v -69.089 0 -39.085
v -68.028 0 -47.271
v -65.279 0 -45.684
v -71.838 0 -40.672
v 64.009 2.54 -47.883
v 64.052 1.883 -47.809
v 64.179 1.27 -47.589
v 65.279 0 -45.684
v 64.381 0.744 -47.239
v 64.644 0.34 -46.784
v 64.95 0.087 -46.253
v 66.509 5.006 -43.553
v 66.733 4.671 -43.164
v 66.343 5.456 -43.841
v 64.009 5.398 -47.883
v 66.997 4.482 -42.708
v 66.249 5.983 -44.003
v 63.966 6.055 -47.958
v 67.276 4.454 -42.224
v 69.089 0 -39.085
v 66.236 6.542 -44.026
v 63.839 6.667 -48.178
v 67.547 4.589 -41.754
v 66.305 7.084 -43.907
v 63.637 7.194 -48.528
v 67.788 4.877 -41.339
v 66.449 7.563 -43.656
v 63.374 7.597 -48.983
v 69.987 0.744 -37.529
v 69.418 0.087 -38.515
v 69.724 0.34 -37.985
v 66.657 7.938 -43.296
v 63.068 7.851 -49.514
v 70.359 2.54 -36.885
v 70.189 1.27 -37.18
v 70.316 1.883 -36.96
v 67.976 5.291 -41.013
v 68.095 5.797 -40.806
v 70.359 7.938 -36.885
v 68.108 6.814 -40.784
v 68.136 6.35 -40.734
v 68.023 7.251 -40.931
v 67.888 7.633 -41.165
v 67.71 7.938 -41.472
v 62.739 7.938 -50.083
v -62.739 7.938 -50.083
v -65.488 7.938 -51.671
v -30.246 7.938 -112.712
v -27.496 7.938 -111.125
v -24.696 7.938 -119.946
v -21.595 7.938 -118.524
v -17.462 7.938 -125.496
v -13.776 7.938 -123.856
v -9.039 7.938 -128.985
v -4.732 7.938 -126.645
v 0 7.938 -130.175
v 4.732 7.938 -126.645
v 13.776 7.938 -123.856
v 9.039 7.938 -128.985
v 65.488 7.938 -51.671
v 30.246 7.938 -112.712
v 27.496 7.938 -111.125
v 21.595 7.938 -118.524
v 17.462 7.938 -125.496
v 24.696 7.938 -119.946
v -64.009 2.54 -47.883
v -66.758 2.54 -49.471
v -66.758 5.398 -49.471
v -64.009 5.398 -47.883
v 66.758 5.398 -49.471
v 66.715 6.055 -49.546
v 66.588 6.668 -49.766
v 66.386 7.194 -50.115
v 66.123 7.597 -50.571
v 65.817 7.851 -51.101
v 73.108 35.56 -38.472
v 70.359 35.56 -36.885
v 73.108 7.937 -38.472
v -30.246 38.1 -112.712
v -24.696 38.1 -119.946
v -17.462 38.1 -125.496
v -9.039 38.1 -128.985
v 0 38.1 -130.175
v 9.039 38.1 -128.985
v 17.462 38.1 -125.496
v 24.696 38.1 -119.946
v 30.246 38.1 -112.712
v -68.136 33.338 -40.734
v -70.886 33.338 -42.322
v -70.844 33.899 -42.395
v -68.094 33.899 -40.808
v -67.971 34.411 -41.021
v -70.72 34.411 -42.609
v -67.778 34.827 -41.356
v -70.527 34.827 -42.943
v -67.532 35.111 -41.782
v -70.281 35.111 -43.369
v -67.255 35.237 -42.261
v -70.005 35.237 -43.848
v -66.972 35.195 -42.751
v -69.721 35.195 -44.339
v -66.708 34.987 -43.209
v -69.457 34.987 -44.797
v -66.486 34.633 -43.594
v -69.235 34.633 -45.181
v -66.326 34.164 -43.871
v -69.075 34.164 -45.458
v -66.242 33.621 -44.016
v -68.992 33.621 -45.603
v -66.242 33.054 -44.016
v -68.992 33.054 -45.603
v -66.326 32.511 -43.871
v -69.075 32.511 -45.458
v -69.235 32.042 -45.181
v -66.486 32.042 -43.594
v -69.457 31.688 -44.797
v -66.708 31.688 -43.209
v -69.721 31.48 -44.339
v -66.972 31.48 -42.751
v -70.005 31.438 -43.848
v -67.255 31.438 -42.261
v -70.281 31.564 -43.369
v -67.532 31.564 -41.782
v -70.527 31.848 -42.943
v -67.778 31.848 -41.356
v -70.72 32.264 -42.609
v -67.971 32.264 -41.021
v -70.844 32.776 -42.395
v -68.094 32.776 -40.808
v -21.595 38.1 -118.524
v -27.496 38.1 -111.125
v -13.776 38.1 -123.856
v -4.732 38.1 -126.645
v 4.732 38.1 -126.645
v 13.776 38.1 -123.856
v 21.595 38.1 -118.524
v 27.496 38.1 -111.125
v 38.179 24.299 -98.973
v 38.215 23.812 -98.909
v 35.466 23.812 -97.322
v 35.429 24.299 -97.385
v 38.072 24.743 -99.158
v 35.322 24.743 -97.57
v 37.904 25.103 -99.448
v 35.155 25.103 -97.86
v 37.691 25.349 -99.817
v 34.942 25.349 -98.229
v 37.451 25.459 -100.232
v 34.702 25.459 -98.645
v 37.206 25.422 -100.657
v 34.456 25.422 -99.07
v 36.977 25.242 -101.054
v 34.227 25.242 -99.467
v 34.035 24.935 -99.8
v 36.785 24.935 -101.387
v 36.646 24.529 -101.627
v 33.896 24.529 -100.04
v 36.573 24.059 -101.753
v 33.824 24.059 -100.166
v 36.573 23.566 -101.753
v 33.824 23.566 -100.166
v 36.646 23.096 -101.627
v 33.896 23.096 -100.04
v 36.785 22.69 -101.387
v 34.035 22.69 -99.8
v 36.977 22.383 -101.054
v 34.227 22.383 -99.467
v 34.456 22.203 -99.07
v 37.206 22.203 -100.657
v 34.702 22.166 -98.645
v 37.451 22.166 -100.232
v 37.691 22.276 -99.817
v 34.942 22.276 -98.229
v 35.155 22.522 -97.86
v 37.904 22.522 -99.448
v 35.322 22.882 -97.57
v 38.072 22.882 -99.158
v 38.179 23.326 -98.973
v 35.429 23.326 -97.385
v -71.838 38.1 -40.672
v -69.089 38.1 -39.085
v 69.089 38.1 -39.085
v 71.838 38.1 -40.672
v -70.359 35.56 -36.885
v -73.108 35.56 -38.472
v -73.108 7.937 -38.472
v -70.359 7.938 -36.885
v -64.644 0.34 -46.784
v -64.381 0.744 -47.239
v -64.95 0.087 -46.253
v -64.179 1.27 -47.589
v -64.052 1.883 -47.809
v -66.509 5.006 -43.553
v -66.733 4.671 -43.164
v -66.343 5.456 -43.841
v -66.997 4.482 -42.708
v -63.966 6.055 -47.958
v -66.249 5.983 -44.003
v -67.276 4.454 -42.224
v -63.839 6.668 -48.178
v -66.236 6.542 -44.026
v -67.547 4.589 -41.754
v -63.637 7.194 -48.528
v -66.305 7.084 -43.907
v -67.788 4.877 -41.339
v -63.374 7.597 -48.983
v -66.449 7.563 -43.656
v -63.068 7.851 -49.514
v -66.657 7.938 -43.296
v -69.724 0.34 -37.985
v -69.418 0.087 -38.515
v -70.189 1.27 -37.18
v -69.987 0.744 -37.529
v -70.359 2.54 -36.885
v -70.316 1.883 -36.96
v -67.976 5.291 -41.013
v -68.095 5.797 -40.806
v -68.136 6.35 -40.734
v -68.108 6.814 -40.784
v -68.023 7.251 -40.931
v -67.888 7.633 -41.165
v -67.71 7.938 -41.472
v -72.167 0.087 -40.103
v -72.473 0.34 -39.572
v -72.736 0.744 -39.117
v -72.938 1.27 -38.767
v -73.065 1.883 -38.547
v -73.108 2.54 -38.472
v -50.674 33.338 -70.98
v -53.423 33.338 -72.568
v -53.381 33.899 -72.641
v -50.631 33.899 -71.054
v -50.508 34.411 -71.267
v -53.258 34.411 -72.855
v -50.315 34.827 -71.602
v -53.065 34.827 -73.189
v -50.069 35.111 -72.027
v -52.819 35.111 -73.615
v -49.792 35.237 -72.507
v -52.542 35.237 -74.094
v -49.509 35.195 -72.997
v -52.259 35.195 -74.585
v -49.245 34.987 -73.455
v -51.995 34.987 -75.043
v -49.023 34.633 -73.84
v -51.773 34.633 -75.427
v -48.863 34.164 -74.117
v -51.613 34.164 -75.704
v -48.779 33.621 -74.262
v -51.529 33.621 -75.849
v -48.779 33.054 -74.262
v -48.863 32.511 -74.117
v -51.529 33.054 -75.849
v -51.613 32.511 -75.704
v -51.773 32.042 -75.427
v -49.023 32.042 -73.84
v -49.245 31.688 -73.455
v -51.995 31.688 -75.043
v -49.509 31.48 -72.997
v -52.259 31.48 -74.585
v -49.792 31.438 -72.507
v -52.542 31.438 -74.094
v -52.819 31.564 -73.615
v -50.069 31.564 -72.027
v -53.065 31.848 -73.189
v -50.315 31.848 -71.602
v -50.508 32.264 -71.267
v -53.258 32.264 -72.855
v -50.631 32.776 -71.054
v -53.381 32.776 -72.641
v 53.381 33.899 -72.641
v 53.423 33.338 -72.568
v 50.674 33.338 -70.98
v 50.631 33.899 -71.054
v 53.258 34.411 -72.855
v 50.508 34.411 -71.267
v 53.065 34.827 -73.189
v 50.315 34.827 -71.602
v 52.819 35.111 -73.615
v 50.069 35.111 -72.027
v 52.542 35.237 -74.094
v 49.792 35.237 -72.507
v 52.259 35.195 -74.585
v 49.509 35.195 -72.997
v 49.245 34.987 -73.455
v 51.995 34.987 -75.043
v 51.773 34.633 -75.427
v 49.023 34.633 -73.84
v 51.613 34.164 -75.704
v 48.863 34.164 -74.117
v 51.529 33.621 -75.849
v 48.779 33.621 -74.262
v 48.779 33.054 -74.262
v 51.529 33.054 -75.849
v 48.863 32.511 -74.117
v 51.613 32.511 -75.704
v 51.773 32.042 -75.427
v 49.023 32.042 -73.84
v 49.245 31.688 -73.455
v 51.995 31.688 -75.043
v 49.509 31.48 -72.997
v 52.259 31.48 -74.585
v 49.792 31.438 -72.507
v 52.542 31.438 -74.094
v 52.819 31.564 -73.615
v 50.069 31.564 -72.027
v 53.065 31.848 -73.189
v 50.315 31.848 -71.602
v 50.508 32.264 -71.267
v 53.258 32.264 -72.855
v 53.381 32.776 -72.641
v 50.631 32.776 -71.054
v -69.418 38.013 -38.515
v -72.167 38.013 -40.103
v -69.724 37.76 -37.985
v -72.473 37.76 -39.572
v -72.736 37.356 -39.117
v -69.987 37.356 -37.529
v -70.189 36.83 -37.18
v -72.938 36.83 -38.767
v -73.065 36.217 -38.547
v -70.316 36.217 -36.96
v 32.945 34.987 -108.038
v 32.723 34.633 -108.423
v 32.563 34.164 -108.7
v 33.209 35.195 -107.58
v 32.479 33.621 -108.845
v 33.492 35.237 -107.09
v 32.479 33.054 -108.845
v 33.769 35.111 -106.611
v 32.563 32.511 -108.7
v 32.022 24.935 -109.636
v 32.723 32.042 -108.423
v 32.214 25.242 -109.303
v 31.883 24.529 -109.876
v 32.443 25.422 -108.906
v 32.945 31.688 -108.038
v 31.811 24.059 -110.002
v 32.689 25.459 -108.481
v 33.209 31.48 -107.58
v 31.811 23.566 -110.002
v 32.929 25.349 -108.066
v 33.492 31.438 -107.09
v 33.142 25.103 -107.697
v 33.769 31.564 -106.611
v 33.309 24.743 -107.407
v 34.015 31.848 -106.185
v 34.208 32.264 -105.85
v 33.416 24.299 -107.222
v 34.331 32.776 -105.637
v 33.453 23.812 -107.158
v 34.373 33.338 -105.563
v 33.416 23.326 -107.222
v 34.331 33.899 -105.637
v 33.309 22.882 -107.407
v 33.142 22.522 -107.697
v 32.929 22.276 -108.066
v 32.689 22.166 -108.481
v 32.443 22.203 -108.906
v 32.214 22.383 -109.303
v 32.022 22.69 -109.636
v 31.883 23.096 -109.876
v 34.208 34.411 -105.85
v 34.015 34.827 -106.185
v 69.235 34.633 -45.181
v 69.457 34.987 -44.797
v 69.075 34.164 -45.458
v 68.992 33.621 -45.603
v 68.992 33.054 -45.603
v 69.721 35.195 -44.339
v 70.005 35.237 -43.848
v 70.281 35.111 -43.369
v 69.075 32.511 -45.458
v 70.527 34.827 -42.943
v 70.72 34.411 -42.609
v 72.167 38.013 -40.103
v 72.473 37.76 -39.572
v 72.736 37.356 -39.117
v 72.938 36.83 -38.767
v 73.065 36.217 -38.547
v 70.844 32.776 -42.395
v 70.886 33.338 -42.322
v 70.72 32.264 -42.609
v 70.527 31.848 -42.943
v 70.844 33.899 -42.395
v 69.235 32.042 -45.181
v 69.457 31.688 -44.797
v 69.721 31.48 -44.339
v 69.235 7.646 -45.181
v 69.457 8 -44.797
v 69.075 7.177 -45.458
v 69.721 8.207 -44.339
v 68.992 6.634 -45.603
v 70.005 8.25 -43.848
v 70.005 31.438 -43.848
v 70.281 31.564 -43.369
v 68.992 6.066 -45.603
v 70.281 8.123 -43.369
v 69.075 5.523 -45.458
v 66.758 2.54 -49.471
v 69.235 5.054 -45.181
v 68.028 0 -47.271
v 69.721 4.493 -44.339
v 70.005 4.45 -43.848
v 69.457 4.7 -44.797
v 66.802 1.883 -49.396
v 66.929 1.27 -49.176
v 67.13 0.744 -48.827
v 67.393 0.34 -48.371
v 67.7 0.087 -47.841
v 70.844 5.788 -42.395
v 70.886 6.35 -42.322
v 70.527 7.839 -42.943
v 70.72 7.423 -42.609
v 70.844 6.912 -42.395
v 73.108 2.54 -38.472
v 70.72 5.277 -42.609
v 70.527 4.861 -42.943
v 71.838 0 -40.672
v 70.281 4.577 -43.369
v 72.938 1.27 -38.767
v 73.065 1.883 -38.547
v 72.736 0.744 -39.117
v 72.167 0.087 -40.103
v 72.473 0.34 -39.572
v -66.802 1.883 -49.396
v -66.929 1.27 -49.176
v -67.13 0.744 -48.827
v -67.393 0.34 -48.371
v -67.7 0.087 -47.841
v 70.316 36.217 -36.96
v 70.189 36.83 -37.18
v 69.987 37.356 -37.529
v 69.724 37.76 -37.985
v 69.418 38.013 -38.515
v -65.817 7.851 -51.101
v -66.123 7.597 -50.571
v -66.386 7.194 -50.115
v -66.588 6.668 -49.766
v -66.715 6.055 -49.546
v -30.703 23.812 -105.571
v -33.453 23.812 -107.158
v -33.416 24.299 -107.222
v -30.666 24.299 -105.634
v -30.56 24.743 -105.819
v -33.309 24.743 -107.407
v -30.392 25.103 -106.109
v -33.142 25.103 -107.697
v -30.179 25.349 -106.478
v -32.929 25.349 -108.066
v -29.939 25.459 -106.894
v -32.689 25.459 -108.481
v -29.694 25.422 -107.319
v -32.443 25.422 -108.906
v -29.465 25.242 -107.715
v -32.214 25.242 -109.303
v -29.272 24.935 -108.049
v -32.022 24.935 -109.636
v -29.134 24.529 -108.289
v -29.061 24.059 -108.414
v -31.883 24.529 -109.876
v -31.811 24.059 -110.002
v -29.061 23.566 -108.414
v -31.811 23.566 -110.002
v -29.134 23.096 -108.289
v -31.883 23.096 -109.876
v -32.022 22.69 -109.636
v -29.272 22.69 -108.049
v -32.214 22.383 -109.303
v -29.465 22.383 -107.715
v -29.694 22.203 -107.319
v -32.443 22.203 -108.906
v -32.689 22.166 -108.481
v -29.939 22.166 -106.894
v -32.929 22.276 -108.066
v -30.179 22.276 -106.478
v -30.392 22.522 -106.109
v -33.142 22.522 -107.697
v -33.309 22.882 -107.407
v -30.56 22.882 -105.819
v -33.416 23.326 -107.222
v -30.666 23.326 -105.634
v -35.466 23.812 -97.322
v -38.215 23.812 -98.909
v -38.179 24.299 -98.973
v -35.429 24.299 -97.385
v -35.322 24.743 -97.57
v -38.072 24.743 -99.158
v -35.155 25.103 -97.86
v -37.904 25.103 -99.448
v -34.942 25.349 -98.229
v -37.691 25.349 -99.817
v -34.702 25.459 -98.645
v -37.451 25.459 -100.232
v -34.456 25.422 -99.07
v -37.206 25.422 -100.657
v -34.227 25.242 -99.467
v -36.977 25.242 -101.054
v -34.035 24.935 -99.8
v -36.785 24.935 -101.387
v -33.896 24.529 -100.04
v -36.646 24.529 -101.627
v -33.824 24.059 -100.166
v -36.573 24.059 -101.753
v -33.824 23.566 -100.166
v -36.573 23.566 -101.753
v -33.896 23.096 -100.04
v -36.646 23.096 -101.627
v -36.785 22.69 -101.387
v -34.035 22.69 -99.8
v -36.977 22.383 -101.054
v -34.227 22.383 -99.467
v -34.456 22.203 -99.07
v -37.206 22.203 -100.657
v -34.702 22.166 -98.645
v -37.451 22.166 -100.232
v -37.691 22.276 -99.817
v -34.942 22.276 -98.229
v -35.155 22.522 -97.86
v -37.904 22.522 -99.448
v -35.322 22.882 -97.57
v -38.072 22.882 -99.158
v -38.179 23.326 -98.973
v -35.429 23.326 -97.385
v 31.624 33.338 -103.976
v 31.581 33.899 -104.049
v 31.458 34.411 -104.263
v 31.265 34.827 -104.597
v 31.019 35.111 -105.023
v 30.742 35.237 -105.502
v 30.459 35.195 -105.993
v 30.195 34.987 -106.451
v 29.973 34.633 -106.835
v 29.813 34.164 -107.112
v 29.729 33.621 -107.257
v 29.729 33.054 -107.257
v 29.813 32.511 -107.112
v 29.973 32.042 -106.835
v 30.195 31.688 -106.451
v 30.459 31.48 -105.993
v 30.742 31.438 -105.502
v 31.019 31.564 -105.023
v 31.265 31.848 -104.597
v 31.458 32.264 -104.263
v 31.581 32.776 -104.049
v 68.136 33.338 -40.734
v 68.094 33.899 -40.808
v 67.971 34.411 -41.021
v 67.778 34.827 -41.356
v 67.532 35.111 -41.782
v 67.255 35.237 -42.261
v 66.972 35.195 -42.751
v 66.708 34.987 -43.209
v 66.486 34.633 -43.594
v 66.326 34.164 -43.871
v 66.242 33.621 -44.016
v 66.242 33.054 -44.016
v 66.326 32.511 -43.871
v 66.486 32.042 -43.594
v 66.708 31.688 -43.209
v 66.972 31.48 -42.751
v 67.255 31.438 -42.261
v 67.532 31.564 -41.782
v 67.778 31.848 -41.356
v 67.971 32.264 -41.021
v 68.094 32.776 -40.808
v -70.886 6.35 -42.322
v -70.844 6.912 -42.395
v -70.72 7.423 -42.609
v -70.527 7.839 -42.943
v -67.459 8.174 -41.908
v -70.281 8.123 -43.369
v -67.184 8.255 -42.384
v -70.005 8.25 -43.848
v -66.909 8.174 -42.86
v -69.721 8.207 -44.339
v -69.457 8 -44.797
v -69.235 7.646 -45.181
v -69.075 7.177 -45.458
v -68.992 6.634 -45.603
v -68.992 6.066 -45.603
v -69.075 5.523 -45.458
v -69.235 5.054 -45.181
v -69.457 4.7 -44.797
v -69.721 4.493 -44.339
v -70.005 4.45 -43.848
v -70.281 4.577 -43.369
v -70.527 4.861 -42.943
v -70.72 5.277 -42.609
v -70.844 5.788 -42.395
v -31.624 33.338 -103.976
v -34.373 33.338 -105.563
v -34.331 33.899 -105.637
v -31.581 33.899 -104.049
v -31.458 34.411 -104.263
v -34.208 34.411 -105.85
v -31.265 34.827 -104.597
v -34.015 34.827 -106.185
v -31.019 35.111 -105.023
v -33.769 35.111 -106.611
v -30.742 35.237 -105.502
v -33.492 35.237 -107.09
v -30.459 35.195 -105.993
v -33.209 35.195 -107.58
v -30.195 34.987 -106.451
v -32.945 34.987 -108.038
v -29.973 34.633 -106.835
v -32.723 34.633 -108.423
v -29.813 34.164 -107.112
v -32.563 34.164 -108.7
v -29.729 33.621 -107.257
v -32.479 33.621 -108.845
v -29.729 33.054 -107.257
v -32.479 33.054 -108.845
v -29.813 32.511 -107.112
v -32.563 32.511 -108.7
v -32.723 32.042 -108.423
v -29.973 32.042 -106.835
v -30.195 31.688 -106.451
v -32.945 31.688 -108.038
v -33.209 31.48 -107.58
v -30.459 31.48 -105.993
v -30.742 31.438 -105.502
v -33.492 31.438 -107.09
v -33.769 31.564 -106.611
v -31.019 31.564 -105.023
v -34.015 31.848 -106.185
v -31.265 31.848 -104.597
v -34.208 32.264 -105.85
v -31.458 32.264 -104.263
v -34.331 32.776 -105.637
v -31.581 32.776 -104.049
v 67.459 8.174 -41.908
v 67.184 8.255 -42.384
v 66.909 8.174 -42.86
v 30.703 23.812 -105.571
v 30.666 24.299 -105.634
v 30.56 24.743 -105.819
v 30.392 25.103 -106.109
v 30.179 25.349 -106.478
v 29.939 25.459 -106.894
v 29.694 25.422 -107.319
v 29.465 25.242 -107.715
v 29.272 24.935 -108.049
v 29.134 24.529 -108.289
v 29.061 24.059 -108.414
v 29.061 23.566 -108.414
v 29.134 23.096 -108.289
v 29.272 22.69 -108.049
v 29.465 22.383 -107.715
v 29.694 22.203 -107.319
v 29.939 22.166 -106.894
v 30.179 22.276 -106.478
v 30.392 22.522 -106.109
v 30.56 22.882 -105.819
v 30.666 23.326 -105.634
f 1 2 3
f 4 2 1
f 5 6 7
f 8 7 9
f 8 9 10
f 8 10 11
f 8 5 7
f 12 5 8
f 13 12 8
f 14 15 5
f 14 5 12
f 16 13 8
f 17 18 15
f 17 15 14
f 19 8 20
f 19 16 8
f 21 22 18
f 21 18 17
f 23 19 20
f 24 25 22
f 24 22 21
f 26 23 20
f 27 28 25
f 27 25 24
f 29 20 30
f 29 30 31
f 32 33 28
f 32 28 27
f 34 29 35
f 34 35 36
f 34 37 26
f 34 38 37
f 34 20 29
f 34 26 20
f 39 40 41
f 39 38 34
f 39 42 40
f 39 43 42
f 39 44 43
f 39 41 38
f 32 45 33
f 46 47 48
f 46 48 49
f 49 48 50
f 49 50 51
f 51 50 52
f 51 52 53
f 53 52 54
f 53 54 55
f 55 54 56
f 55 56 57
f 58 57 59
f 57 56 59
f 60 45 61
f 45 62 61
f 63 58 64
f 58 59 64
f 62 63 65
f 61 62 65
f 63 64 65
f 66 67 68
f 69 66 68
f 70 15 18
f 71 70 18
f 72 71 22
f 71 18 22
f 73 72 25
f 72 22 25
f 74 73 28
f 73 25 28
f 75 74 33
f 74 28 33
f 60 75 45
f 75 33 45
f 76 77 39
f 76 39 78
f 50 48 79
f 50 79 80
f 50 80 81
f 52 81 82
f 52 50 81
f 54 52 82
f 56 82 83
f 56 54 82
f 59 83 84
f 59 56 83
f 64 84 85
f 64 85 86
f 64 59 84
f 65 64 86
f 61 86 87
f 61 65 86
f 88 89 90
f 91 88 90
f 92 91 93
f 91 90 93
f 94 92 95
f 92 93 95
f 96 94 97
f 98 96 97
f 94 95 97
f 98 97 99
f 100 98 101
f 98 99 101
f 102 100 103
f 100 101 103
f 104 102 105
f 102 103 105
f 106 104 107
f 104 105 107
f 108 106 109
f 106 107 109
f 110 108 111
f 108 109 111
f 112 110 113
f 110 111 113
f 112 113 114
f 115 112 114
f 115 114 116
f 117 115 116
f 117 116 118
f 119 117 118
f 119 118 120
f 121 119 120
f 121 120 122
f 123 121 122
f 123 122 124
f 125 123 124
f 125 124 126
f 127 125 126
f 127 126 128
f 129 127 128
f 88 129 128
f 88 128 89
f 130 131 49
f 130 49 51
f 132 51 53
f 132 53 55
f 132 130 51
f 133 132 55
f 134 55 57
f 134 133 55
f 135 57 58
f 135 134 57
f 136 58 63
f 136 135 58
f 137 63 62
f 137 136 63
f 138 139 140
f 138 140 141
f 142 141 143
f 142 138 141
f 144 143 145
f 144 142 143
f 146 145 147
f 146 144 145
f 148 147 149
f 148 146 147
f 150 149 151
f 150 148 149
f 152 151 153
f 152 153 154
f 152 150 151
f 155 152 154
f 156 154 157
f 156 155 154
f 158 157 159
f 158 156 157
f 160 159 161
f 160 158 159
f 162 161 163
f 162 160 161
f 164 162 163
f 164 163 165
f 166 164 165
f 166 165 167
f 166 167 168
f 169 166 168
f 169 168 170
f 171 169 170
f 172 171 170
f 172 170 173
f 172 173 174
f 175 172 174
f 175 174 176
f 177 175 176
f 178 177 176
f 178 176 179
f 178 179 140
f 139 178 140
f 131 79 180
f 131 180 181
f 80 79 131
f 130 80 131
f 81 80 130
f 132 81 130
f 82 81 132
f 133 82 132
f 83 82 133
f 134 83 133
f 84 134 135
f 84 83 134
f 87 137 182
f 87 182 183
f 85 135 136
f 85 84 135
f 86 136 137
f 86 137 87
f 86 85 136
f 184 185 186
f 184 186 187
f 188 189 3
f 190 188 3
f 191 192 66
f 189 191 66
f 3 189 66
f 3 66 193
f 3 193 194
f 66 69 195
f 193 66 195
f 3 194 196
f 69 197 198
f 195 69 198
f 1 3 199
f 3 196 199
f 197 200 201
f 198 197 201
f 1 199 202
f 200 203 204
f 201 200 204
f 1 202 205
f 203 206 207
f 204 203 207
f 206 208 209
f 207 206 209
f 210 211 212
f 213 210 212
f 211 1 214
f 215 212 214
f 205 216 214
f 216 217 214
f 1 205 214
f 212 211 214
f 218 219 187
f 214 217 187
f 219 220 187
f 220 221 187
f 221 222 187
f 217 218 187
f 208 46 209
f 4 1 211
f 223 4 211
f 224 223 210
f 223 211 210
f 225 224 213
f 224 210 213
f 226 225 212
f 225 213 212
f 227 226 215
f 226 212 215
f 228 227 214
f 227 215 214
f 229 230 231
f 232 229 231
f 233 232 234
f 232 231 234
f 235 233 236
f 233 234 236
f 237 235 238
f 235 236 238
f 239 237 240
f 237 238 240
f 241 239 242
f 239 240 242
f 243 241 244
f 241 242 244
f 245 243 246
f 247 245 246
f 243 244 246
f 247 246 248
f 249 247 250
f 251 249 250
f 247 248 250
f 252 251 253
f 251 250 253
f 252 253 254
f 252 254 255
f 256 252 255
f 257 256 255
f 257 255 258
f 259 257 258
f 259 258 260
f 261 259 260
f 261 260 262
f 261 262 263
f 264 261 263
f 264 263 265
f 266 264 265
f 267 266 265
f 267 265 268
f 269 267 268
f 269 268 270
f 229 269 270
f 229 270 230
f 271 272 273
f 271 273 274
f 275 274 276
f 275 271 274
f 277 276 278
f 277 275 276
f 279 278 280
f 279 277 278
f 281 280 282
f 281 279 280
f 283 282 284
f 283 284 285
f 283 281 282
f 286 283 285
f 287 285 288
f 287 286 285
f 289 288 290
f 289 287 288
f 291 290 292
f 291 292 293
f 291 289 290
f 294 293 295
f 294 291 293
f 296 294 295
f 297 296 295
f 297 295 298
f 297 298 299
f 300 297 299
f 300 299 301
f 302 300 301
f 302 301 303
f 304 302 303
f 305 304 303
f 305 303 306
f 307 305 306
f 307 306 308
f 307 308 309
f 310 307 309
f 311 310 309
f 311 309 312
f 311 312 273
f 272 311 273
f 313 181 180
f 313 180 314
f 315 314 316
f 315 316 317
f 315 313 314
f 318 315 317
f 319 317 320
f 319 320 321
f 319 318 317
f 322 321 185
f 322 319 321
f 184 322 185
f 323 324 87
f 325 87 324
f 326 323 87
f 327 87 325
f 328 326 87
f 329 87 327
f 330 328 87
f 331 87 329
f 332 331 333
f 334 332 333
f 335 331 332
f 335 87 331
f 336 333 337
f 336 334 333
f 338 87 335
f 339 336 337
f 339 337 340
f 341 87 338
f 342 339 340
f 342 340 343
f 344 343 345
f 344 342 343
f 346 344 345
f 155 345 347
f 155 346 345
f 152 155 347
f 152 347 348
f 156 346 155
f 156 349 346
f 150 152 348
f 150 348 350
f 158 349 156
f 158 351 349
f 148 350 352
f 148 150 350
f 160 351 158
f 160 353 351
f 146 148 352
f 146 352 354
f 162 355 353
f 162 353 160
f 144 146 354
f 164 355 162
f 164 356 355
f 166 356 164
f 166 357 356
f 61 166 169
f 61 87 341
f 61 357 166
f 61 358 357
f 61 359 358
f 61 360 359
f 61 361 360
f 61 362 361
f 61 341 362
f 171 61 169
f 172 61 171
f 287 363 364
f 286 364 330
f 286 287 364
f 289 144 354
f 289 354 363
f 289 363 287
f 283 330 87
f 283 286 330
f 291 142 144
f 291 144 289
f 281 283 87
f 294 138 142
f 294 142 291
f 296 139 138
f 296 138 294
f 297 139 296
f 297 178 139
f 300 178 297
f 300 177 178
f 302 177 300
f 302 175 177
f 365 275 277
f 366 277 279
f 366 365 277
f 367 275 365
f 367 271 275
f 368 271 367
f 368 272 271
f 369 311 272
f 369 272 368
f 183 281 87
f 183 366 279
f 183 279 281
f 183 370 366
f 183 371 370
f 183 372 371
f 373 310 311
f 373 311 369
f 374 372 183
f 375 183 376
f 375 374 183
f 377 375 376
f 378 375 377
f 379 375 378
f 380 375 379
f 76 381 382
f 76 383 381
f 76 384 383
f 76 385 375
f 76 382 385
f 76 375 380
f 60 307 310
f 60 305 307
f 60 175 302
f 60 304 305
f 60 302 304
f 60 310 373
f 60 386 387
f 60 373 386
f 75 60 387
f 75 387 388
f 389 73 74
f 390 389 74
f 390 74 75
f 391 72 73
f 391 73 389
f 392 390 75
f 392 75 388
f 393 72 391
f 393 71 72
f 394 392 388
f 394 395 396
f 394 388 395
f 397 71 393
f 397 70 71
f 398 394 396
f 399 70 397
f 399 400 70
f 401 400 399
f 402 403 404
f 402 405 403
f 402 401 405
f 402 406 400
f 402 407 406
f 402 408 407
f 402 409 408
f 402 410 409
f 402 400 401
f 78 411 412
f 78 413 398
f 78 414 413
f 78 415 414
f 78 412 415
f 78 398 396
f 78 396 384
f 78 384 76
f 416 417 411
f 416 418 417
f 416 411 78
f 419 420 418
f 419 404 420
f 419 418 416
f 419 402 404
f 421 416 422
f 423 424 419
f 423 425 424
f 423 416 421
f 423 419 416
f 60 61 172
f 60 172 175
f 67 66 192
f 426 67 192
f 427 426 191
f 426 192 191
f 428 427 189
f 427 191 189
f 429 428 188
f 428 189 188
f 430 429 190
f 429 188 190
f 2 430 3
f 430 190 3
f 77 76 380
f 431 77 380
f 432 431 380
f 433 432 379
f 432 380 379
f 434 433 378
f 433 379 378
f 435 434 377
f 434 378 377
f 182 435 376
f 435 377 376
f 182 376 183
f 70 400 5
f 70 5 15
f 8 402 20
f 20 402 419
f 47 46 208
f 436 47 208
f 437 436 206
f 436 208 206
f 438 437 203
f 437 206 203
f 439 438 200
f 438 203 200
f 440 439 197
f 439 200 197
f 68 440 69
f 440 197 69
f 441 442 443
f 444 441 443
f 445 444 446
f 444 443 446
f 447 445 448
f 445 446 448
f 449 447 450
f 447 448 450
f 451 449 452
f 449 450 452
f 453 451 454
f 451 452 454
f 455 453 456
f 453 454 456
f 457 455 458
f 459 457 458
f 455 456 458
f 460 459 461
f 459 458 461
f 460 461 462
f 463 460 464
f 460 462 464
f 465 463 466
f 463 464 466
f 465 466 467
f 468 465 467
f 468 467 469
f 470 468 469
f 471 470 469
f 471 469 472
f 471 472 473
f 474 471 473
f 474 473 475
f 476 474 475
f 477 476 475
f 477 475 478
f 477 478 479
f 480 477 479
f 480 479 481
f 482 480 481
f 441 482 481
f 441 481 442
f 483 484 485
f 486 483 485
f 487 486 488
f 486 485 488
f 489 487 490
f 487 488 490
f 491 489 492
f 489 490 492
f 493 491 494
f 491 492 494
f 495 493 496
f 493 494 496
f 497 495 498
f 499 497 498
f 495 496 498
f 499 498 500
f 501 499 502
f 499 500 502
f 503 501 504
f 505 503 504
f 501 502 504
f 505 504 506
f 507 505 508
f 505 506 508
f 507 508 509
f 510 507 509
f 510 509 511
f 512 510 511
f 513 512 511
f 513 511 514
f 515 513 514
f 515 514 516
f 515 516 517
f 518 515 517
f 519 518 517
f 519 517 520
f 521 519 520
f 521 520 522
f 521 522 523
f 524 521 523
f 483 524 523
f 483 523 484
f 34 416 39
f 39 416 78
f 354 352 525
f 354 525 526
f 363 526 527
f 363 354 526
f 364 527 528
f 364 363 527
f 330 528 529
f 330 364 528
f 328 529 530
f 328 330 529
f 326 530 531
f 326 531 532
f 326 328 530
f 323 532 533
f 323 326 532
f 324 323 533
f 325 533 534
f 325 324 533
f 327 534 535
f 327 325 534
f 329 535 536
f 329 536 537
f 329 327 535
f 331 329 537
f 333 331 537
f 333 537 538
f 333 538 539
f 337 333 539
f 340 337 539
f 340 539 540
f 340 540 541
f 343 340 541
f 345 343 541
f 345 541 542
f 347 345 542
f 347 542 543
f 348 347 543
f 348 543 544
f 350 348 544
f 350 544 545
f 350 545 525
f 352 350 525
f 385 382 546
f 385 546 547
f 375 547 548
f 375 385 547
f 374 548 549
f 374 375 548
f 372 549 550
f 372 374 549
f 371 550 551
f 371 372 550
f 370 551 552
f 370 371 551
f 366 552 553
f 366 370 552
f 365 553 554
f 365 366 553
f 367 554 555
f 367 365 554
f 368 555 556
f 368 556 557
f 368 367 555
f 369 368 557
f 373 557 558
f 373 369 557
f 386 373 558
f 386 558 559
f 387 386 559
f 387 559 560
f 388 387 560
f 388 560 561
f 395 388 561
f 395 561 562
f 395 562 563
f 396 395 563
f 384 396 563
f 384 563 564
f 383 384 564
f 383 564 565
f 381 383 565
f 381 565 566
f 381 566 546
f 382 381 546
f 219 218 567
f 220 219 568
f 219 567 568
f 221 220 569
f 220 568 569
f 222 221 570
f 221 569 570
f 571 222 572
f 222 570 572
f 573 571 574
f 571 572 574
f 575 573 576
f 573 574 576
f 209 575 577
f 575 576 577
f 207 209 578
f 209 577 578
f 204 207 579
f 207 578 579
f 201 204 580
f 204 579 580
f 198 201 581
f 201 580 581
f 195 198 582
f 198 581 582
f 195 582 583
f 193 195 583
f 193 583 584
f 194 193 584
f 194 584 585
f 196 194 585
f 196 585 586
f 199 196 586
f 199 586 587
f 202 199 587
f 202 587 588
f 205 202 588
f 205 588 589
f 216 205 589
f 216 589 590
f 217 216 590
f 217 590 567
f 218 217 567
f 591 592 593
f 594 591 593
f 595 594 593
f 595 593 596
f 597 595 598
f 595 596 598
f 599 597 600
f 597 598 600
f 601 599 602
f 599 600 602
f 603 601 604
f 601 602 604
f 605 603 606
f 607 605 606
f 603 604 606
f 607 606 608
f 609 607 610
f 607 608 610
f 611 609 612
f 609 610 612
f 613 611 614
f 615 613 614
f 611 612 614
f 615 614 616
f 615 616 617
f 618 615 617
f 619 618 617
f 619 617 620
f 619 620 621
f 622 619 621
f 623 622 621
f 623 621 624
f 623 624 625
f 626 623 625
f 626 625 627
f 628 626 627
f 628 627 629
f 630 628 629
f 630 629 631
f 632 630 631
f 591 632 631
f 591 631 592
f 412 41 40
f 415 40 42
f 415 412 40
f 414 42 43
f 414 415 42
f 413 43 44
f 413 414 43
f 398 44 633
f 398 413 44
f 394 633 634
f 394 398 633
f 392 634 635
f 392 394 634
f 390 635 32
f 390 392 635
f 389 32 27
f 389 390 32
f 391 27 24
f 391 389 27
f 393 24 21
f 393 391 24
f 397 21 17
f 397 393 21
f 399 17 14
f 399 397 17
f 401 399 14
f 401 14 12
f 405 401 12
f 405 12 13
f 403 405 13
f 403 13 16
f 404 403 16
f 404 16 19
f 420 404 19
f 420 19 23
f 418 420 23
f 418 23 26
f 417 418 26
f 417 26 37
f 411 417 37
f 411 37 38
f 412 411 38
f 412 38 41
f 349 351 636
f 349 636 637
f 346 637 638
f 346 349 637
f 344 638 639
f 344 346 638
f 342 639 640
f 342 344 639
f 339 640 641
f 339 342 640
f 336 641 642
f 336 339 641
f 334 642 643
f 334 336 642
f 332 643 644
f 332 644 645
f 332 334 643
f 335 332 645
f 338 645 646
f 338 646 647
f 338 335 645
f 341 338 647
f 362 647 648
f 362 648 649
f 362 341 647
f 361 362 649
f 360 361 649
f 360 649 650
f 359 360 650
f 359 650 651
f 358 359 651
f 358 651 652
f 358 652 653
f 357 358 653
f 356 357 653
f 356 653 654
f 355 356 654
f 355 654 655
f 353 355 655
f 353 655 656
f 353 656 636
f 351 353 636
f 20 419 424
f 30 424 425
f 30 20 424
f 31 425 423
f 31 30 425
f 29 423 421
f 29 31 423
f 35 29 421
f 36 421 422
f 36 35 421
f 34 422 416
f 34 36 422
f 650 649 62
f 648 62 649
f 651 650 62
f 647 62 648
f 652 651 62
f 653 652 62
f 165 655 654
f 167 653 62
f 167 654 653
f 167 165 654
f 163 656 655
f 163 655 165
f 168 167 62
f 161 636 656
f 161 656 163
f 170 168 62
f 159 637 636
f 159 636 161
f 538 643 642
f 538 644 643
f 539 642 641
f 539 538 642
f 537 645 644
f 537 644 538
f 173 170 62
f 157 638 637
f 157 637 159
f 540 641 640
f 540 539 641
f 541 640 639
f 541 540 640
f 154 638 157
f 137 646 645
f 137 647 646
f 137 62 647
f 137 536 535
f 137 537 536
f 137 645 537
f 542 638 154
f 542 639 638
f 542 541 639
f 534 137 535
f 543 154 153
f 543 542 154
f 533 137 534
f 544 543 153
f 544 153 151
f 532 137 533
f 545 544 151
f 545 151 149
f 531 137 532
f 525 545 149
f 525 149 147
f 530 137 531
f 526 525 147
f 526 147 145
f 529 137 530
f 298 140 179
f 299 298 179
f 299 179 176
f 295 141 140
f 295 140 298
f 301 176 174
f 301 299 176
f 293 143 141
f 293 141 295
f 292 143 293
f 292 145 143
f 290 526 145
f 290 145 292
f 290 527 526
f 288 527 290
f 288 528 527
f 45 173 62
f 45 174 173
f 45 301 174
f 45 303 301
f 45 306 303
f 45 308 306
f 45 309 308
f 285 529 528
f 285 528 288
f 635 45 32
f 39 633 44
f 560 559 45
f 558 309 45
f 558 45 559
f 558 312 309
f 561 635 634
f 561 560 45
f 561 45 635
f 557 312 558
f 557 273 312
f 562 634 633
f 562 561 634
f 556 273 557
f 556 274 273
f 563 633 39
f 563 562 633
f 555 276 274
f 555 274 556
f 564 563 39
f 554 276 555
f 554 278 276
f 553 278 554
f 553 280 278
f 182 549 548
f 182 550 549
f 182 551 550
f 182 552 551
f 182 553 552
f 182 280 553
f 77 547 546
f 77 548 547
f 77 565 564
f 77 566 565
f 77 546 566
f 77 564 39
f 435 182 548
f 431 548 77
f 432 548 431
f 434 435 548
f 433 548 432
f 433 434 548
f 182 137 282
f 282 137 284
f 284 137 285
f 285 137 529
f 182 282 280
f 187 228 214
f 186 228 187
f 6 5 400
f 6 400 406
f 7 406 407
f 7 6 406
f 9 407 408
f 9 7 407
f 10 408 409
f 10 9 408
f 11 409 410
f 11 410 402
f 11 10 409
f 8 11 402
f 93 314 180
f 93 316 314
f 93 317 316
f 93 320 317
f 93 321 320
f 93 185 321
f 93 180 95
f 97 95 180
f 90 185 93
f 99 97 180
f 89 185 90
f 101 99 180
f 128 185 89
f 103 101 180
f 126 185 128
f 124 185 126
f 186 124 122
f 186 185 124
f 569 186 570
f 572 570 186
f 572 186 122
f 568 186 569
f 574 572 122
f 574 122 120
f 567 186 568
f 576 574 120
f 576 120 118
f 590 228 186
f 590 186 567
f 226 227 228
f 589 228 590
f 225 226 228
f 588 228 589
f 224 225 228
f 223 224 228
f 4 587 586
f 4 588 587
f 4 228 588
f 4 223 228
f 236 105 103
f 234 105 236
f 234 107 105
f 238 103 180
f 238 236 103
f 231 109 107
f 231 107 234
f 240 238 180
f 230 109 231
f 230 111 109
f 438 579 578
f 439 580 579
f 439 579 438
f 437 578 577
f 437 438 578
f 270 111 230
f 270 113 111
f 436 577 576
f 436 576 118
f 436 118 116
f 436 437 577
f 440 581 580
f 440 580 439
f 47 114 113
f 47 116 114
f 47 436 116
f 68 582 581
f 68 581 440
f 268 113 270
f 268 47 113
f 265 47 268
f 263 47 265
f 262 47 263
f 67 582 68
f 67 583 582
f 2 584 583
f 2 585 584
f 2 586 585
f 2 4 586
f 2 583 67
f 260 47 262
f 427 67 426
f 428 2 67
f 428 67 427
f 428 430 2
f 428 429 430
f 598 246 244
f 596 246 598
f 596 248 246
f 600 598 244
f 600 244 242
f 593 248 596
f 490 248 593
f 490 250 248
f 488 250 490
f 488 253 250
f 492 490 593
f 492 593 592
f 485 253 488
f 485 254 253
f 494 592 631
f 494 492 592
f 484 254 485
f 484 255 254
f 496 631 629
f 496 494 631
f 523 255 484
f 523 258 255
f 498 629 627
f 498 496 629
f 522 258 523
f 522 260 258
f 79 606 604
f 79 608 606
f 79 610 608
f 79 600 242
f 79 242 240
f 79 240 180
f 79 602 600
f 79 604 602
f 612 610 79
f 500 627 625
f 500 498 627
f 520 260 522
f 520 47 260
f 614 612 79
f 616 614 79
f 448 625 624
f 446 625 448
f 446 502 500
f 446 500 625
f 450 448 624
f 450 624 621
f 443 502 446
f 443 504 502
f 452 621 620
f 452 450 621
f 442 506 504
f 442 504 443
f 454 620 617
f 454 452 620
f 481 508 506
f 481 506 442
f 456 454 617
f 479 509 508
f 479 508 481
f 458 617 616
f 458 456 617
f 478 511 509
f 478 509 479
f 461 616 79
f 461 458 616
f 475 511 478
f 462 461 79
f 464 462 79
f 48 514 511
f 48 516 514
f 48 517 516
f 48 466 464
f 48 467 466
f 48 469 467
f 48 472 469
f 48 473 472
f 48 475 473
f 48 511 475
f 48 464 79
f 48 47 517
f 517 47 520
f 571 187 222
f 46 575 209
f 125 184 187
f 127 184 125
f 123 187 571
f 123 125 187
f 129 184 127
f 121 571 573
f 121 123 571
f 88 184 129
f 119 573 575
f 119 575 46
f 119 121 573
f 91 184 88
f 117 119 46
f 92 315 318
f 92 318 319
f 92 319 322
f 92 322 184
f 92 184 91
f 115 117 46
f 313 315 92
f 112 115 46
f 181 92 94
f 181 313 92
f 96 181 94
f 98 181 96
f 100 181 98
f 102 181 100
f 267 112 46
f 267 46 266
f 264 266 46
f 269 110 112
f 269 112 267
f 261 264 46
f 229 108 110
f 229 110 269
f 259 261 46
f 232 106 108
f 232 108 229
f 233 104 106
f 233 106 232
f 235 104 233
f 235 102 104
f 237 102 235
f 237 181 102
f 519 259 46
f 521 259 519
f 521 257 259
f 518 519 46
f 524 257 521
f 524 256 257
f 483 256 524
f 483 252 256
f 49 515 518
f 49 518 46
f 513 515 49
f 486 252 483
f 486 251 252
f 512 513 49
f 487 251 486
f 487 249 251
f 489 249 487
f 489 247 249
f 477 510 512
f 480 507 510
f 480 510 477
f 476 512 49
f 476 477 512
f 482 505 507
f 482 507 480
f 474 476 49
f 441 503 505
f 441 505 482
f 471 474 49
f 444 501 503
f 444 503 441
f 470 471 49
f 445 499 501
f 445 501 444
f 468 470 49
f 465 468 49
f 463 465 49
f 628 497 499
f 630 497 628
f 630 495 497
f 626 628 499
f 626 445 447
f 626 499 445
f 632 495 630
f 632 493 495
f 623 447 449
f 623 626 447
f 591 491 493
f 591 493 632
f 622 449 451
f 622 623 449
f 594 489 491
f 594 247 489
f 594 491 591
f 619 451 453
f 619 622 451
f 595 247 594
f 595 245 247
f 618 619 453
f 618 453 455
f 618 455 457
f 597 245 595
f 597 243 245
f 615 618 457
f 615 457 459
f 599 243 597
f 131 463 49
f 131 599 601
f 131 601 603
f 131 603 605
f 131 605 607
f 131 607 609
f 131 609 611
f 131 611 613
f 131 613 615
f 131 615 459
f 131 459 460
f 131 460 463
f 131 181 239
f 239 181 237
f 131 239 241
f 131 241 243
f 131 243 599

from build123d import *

# Parameters (mm, degrees)
BOSS_EXTRUDE10_DEPTH = 30.1625
SKETCH29_W           = 12.7
SKETCH29_H           = 7.9375
BOSS_EXTRUDE12_DEPTH = 6.35
CUT_EXTRUDE19_REACH  = 181.357
SKETCH30_R           = 1.651
CUT_EXTRUDE23_REACH  = 181.357
SKETCH38_R           = 1.905
FILLET24_R           = 2.54
CONVERT_SOLID1_DEPTH = 38.1


# Read off the part's stored shape, not the designer's step: Convert-Solid1
with BuildPart() as part:
    # Sketch28 → Boss-Extrude10 (new body)
    with BuildSketch(Plane(origin=(0, 38.1, 0), x_dir=(-1, 0, 0), z_dir=(0, -1, 0))):
        with BuildLine():
            Line((32.995567884, 114.3), (75.858067884, 40.059972261))
            Line((75.858067884, 40.059972261), (70.35880657, 36.884972261))
            Line((70.35880657, 36.884972261), (27.49630657, 111.125))
            ThreePointArc((27.49630657, 111.125), (0, 127), (-27.49630657, 111.125))
            Line((-27.49630657, 111.125), (-70.35880657, 36.884972261))
            Line((-70.35880657, 36.884972261), (-75.858067884, 40.059972261))
            Line((-75.858067884, 40.059972261), (-32.995567884, 114.3))
            ThreePointArc((-32.995567884, 114.3), (0, 133.35), (32.995567884, 114.3))
        make_face()
    extrude(amount=BOSS_EXTRUDE10_DEPTH)

    # Sketch29 → Boss-Extrude12 (add)
    with BuildSketch(Plane(origin=(-74.240027739, 0, -42.8625), x_dir=(-0.5, 0, 0.8660254037844387), z_dir=(-0.8660254037844387, 0, -0.5))):
        with Locations((-3.11391971, 3.96875)):
            Rectangle(SKETCH29_W, SKETCH29_H)
    boss_extrude12 = extrude(amount=-BOSS_EXTRUDE12_DEPTH)

    # Sketch30 → Cut-Extrude19 (cut, up to next)
    with BuildSketch(Plane(origin=(-74.240027739, 0, -42.8625), x_dir=(-0.5, 0, 0.8660254037844387), z_dir=(-0.8660254037844387, 0, -0.5)), mode=Mode.PRIVATE) as cut_extrude19_sk1:
        with Locations((-77.72641971, 23.8125)):
            Circle(SKETCH30_R)
    cut_extrude19_tool1 = extrude(cut_extrude19_sk1.sketch, amount=-CUT_EXTRUDE19_REACH, mode=Mode.PRIVATE) & part.part
    # Sketch30 → Cut-Extrude19 (cut, up to next)
    with BuildSketch(Plane(origin=(-74.240027739, 0, -42.8625), x_dir=(-0.5, 0, 0.8660254037844387), z_dir=(-0.8660254037844387, 0, -0.5)), mode=Mode.PRIVATE) as cut_extrude19_sk2:
        with Locations((-68.20141971, 23.8125)):
            Circle(SKETCH30_R)
    cut_extrude19_tool2 = extrude(cut_extrude19_sk2.sketch, amount=-CUT_EXTRUDE19_REACH, mode=Mode.PRIVATE) & part.part
    cut_extrude19_1 = cut_extrude19_tool1.solids().sort_by_distance((-35.376818, 23.8125, -110.175554))[0]
    add(cut_extrude19_1, mode=Mode.SUBTRACT)
    cut_extrude19_2 = cut_extrude19_tool2.solids().sort_by_distance((-40.139318, 23.8125, -101.926662))[0]
    add(cut_extrude19_2, mode=Mode.SUBTRACT)
    cut_extrude19 = cut_extrude19_1 + cut_extrude19_2  # Cut-Extrude19 as one shape, for the pattern or mirror that repeats it

    # Sketch38 → Cut-Extrude23 (cut, up to next)
    with BuildSketch(Plane(origin=(-74.240027739, 0, -42.8625), x_dir=(-0.5, 0, 0.8660254037844387), z_dir=(-0.8660254037844387, 0, -0.5)), mode=Mode.PRIVATE) as cut_extrude23_sk1:
        with Locations((-76.13891971, 33.3375)):
            Circle(SKETCH38_R)
    cut_extrude23_tool1 = extrude(cut_extrude23_sk1.sketch, amount=-CUT_EXTRUDE23_REACH, mode=Mode.PRIVATE) & part.part
    # Sketch38 → Cut-Extrude23 (cut, up to next)
    with BuildSketch(Plane(origin=(-74.240027739, 0, -42.8625), x_dir=(-0.5, 0, 0.8660254037844387), z_dir=(-0.8660254037844387, 0, -0.5)), mode=Mode.PRIVATE) as cut_extrude23_sk2:
        with Locations((-38.03891971, 33.3375)):
            Circle(SKETCH38_R)
    cut_extrude23_tool2 = extrude(cut_extrude23_sk2.sketch, amount=-CUT_EXTRUDE23_REACH, mode=Mode.PRIVATE) & part.part
    # Sketch38 → Cut-Extrude23 (cut, up to next)
    with BuildSketch(Plane(origin=(-74.240027739, 0, -42.8625), x_dir=(-0.5, 0, 0.8660254037844387), z_dir=(-0.8660254037844387, 0, -0.5)), mode=Mode.PRIVATE) as cut_extrude23_sk3:
        with Locations((-3.11391971, 33.3375)):
            Circle(SKETCH38_R)
    cut_extrude23_tool3 = extrude(cut_extrude23_sk3.sketch, amount=-CUT_EXTRUDE23_REACH, mode=Mode.PRIVATE) & part.part
    # Sketch38 → Cut-Extrude23 (cut, up to next)
    with BuildSketch(Plane(origin=(-74.240027739, 0, -42.8625), x_dir=(-0.5, 0, 0.8660254037844387), z_dir=(-0.8660254037844387, 0, -0.5)), mode=Mode.PRIVATE) as cut_extrude23_sk4:
        with Locations((-3.11391971, 6.35)):
            Circle(SKETCH38_R)
    cut_extrude23_tool4 = extrude(cut_extrude23_sk4.sketch, amount=-CUT_EXTRUDE23_REACH, mode=Mode.PRIVATE) & part.part
    cut_extrude23_1 = cut_extrude23_tool1.solids().sort_by_distance((-36.170568, 33.3375, -108.800739))[0]
    add(cut_extrude23_1, mode=Mode.SUBTRACT)
    cut_extrude23_2 = cut_extrude23_tool2.solids().sort_by_distance((-55.220568, 33.3375, -75.805171))[0]
    add(cut_extrude23_2, mode=Mode.SUBTRACT)
    cut_extrude23_3 = cut_extrude23_tool3.solids().sort_by_distance((-72.683068, 33.3375, -45.559234))[0]
    add(cut_extrude23_3, mode=Mode.SUBTRACT)
    cut_extrude23_4 = cut_extrude23_tool4.solids().sort_by_distance((-72.683068, 6.35, -45.559234))[0]
    add(cut_extrude23_4, mode=Mode.SUBTRACT)
    cut_extrude23 = cut_extrude23_1 + cut_extrude23_2 + cut_extrude23_3 + cut_extrude23_4  # Cut-Extrude23 as one shape, for the pattern or mirror that repeats it

    # Mirror7: Boss-Extrude12, Cut-Extrude19, Cut-Extrude23 across plane
    add(boss_extrude12.mirror(Plane(origin=(0, 0, 0), x_dir=(0, 0, 1), z_dir=(1, 0, 0))))
    add(cut_extrude19.mirror(Plane(origin=(0, 0, 0), x_dir=(0, 0, 1), z_dir=(1, 0, 0))), mode=Mode.SUBTRACT)
    add(cut_extrude23.mirror(Plane(origin=(0, 0, 0), x_dir=(0, 0, 1), z_dir=(1, 0, 0))), mode=Mode.SUBTRACT)

    # Fillet24
    fillet24_edges = [part.edges().sort_by_distance(p)[0] for p in [
        (73.108437227, 38.1, -38.472472261),
        (-73.108437227, 0, -38.472472261),
        (-66.758437227, 0, -49.470994889),
        (-66.758437227, 7.9375, -49.470994889),
        (73.108437227, 0, -38.472472261),
        (66.758437227, 7.9375, -49.470994889),
        (66.758437227, 0, -49.470994889),
        (-73.108437227, 38.1, -38.472472261),
    ]]
    fillet(fillet24_edges, radius=FILLET24_R)

    # Convert-Solid1 outline → Convert-Solid1 (cut)
    with BuildSketch(Plane(origin=(0, 0, 0), x_dir=(1, 0, 0), z_dir=(0, 1, 0))):
        with BuildLine():
            ThreePointArc((-30.245937227, 112.7125), (0, 130.175), (30.245937227, 112.7125))
            Line((30.245937227, 112.7125), (73.108437227, 38.472472261))
            Line((73.108437227, 38.472472261), (75.858067884, 40.059972261))
            Line((75.858067884, 40.059972261), (32.995567884, 114.3))
            ThreePointArc((32.995567884, 114.3), (0, 133.35), (-32.995567884, 114.3))
            Line((-32.995567884, 114.3), (-75.858067884, 40.059972261))
            Line((-75.858067884, 40.059972261), (-73.108437227, 38.472472261))
            Line((-73.108437227, 38.472472261), (-30.245937227, 112.7125))
        make_face()
    extrude(amount=CONVERT_SOLID1_DEPTH, mode=Mode.SUBTRACT)


solid = part.part
